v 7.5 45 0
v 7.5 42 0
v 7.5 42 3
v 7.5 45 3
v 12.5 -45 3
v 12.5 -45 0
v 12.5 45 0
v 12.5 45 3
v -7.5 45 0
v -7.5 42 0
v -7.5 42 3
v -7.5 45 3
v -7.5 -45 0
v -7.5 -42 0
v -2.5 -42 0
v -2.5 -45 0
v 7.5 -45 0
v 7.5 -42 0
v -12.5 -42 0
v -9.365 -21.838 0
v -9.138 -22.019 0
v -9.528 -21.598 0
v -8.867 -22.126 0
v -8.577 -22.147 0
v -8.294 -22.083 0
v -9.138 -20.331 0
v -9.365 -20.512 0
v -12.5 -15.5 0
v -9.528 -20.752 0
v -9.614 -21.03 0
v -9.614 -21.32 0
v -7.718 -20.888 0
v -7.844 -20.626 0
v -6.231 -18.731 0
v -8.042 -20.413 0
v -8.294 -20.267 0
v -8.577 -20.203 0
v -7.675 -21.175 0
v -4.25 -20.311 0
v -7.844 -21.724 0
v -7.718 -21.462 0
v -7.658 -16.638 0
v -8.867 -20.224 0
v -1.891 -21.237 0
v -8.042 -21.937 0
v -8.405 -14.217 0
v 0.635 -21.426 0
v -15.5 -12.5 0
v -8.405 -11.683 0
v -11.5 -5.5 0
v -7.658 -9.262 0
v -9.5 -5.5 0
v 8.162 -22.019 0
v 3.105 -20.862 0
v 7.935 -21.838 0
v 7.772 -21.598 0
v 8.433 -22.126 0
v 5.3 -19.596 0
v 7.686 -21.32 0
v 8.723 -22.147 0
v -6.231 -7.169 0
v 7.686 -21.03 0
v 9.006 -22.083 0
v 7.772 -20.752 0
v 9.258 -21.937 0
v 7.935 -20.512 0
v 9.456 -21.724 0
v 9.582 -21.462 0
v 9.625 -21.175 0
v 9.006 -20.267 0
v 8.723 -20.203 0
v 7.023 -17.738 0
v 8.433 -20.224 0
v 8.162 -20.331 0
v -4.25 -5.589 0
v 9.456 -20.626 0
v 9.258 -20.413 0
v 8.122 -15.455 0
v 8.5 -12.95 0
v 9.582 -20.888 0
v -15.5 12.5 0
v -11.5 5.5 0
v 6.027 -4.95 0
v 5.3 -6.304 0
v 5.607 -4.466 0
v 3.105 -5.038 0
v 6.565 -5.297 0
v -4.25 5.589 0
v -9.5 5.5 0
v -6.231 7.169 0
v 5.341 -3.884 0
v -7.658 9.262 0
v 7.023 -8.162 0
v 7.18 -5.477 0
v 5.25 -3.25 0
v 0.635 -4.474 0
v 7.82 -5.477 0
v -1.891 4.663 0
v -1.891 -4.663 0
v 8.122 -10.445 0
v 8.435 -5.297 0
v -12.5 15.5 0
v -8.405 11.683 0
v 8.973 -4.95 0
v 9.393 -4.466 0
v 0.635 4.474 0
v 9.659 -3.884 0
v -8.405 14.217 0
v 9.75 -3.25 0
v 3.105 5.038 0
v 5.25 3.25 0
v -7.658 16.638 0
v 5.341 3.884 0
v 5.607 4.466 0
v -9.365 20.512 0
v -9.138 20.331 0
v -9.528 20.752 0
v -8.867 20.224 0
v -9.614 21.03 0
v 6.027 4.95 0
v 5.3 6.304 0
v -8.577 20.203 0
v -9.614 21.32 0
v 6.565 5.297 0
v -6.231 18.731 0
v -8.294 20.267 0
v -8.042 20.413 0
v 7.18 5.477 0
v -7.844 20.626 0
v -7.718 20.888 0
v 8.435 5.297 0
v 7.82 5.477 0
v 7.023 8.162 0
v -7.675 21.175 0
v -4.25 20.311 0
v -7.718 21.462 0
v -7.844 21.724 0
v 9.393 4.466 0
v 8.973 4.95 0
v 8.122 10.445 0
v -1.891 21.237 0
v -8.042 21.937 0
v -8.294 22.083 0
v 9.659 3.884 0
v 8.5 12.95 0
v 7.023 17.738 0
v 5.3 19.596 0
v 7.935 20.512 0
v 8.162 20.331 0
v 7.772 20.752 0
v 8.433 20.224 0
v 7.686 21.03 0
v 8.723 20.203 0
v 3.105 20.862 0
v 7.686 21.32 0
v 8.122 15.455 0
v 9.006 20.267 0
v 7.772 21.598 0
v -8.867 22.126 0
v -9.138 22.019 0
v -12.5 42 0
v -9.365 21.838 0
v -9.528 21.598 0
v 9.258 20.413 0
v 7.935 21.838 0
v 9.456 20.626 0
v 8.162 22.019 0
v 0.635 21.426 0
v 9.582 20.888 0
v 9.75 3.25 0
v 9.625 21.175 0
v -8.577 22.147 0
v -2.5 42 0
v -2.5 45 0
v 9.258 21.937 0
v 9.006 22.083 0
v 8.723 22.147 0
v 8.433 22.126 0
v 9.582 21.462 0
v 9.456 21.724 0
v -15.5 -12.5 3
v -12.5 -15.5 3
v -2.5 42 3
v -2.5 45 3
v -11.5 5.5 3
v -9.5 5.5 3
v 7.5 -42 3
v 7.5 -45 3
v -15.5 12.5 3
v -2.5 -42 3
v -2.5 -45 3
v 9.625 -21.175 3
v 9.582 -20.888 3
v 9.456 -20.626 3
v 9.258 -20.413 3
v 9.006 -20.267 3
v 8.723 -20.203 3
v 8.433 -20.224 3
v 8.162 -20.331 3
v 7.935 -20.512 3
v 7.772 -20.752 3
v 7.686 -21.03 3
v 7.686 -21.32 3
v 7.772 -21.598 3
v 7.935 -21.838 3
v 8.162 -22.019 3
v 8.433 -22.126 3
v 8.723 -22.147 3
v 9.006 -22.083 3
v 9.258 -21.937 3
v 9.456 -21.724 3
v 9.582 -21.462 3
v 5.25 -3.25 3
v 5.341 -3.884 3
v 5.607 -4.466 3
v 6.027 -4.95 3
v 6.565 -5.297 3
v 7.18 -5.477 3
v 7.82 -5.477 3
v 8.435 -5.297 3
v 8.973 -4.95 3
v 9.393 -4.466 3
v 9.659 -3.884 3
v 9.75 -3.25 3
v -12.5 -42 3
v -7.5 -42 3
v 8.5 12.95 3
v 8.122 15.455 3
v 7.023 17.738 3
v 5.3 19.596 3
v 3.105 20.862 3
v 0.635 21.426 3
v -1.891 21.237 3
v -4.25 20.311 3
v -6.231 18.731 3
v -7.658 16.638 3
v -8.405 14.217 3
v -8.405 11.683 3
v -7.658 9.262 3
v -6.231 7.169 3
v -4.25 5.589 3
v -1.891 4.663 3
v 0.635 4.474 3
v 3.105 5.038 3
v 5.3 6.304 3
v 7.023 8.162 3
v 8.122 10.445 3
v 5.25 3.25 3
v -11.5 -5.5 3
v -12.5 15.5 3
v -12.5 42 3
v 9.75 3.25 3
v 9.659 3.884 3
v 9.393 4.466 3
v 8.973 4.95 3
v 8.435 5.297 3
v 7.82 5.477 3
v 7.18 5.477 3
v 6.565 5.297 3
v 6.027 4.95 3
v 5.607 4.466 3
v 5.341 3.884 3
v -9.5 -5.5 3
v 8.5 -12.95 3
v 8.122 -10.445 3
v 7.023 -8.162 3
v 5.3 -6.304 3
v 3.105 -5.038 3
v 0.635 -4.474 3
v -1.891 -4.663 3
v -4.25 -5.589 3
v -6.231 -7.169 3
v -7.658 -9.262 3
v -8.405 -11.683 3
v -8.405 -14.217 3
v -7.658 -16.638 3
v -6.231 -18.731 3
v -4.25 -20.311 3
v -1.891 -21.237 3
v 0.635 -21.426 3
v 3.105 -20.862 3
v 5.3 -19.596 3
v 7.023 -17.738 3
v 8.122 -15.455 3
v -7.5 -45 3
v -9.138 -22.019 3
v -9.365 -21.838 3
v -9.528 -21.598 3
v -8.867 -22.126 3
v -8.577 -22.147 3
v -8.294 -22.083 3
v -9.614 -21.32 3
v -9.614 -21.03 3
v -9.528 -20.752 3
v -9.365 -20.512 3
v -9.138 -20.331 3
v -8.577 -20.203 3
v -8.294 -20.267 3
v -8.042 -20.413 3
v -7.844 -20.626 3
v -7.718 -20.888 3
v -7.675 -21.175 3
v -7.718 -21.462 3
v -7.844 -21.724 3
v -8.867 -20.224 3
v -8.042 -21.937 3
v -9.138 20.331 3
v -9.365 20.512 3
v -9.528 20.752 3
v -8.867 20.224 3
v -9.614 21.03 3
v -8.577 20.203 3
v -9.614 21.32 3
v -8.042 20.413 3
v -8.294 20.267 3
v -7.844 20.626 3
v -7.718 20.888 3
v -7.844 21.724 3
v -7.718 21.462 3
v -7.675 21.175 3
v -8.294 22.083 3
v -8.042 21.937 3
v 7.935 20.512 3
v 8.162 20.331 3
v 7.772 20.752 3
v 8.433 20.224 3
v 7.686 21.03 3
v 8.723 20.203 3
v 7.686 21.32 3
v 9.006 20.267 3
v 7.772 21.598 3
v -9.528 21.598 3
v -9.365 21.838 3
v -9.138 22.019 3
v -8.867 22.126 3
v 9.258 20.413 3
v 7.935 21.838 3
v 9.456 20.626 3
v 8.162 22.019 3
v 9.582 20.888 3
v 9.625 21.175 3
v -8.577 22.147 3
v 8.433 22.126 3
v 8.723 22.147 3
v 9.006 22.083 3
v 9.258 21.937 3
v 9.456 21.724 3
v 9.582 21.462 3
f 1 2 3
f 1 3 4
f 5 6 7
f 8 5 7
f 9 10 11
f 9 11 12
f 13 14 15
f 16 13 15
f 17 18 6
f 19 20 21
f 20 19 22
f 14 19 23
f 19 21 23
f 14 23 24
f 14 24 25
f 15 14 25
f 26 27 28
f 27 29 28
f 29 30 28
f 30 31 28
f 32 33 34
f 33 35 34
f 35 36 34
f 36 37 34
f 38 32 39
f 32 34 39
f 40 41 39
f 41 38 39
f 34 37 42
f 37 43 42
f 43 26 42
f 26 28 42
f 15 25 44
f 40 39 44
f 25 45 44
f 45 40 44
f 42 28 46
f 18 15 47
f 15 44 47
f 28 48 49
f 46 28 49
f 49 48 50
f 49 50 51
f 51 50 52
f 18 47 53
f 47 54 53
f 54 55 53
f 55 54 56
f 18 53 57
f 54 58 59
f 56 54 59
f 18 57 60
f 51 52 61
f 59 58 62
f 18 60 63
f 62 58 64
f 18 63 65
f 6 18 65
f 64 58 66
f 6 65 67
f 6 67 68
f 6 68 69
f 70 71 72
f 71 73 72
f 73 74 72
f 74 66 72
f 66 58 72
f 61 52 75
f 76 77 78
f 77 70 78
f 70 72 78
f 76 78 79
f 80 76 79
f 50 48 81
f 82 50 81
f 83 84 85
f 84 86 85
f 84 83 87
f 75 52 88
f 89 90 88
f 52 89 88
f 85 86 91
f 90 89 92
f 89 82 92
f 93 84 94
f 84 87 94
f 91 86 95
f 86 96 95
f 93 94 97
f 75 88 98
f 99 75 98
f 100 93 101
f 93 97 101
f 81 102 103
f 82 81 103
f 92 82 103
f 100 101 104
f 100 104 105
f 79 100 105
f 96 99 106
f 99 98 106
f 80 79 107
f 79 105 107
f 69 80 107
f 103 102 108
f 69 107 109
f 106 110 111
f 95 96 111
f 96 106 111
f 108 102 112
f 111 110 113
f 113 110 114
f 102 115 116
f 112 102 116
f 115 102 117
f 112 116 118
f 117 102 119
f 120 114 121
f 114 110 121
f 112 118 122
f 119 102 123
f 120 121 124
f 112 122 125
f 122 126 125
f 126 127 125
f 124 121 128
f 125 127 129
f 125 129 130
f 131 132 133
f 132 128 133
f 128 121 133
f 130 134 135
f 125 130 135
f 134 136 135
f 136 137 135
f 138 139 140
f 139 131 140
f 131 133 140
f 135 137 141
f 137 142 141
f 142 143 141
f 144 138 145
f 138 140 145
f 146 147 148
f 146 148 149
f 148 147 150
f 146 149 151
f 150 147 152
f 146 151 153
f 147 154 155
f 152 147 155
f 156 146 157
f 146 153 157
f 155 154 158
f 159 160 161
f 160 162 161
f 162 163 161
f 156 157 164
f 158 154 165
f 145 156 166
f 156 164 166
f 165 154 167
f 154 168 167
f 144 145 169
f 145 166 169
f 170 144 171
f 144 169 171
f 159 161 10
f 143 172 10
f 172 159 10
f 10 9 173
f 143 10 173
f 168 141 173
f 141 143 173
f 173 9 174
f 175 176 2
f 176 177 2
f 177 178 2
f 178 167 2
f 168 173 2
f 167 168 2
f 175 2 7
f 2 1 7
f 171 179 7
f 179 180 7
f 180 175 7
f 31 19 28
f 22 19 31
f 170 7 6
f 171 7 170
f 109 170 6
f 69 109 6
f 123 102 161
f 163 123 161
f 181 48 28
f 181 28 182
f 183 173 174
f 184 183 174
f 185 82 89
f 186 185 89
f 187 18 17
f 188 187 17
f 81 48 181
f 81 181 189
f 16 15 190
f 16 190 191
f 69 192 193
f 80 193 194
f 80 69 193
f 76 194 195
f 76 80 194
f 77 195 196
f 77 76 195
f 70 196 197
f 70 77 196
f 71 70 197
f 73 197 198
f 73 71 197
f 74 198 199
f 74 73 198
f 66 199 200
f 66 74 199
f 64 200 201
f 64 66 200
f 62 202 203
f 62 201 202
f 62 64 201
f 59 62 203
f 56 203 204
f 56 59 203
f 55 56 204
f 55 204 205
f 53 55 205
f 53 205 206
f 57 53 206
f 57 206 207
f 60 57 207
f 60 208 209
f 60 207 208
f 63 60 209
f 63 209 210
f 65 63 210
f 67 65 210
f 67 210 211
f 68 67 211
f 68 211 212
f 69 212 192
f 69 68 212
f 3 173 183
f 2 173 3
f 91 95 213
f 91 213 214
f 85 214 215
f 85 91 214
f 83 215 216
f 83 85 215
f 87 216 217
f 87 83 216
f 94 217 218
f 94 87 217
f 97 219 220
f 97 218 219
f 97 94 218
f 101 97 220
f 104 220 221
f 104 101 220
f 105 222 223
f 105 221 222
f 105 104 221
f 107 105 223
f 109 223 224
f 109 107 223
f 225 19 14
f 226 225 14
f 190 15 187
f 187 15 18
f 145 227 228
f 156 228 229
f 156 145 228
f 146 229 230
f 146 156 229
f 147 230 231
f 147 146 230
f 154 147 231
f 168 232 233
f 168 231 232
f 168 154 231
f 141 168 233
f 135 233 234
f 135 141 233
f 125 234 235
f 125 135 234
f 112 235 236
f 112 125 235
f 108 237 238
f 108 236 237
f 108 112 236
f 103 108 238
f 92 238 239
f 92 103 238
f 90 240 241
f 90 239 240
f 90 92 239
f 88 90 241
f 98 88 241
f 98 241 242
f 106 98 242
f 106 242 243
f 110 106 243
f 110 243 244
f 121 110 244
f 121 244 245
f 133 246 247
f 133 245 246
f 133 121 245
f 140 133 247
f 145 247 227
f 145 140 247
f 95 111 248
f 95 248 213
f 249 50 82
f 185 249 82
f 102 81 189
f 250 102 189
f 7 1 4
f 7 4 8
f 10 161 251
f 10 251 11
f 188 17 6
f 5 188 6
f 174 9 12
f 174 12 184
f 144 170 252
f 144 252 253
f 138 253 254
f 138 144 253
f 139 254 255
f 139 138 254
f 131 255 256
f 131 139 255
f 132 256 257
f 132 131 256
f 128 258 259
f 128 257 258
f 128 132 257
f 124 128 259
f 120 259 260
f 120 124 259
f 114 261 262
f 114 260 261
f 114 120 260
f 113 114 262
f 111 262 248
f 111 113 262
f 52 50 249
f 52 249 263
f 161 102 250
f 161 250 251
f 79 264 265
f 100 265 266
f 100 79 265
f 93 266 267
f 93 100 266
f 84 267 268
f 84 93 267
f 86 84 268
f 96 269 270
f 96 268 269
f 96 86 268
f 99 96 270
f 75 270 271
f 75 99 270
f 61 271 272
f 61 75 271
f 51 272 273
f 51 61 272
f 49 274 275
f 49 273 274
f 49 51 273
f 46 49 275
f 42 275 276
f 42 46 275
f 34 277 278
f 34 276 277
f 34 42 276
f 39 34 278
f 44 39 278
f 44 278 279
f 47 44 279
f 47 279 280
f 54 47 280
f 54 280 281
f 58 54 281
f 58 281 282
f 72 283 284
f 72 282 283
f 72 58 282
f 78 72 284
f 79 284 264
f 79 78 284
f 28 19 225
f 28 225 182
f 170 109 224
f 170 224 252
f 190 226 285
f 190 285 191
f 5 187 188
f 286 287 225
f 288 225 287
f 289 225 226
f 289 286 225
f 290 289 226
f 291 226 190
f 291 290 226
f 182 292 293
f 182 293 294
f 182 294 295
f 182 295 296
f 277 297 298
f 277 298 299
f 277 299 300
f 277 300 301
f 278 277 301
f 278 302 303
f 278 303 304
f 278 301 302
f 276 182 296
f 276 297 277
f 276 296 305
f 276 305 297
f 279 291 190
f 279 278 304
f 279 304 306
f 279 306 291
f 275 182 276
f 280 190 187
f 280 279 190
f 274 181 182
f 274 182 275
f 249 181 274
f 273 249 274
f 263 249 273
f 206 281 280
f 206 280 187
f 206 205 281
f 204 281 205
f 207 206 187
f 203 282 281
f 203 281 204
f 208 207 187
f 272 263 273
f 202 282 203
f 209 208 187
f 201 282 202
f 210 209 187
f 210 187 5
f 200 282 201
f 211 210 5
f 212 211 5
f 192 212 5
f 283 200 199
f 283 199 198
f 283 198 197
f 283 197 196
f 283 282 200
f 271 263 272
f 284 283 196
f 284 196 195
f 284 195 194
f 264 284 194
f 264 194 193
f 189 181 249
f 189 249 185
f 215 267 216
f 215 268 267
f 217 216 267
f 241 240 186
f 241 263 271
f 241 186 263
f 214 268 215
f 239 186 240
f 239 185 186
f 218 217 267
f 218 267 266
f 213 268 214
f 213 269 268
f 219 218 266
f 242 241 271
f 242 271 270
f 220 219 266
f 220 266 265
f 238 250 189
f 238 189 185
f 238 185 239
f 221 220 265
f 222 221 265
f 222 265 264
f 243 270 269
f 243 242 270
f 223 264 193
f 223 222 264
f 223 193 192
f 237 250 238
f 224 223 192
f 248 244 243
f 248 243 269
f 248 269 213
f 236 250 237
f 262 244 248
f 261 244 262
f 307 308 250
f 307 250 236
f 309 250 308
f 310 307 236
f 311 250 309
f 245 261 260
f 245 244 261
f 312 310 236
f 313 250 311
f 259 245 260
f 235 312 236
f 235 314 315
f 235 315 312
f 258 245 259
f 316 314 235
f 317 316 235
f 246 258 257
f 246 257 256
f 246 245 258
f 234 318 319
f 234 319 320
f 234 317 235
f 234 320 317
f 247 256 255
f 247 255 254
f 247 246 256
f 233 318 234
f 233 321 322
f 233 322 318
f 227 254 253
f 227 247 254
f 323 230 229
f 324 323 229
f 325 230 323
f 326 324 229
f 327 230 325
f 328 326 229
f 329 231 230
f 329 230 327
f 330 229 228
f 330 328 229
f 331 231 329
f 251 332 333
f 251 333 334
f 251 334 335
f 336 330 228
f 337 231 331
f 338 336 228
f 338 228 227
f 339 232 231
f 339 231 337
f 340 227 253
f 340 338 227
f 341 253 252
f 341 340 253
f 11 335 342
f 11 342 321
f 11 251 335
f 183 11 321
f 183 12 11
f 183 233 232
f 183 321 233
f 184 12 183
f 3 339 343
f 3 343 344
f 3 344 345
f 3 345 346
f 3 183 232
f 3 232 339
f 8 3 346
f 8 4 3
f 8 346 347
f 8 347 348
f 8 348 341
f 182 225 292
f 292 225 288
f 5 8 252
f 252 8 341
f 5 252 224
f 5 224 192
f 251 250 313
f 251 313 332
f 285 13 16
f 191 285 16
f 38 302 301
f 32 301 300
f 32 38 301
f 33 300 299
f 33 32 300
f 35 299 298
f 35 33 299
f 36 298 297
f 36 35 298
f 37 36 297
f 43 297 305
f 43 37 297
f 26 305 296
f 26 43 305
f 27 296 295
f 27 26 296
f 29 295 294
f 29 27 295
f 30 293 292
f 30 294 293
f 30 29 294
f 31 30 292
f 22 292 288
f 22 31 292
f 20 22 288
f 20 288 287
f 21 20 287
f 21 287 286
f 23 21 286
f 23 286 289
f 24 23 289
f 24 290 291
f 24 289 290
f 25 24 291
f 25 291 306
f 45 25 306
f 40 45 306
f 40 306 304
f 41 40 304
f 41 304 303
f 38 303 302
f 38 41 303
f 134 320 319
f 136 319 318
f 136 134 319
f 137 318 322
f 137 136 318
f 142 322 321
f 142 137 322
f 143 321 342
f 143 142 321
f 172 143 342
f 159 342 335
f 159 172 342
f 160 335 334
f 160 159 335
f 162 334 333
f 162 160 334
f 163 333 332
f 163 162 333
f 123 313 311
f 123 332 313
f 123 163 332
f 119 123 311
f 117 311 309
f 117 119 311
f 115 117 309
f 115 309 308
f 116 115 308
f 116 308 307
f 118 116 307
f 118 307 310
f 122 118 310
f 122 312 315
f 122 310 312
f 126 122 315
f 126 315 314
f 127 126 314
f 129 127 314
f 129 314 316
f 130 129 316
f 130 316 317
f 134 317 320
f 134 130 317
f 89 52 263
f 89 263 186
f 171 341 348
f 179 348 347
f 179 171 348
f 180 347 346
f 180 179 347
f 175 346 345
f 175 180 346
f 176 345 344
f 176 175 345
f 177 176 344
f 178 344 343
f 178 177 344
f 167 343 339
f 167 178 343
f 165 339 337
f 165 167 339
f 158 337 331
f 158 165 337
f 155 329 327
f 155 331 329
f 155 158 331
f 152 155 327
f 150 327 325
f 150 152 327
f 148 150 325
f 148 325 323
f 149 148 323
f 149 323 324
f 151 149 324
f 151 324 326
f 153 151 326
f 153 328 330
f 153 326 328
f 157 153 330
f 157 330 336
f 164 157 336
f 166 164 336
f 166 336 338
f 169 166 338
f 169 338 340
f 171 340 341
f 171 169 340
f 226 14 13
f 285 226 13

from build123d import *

# Parameters (mm, degrees)
CROQUIS2_W              = 25
CROQUIS2_H              = 90
SALIENTE_EXTRUIR1_DEPTH = 3
CROQUIS3_W              = 10
CROQUIS3_H              = 3
CROQUIS3_W_2            = 5
CORTAR_EXTRUIR1_DEPTH   = 47.800106837
CROQUIS5_R              = 8.5
CROQUIS5_R_2            = 0.975
CORTAR_EXTRUIR2_DEPTH   = 47.800106837
CROQUIS6_W              = 2
CROQUIS6_H              = 11
CORTAR_EXTRUIR3_DEPTH   = 10
CROQUIS7_W              = 3
CROQUIS7_H              = 25
SALIENTE_EXTRUIR2_DEPTH = 3
CHAFL_N1_SIZE           = 3


with BuildPart() as part:
    # Croquis2 → Saliente-Extruir1 (new body)
    with BuildSketch(Plane.XY):
        Rectangle(CROQUIS2_W, CROQUIS2_H)
    extrude(amount=SALIENTE_EXTRUIR1_DEPTH)

    # Croquis3 → Cortar-Extruir1 (cut, through all)
    with BuildSketch(Plane.XY):
        with Locations((2.5, 43.5)):
            Rectangle(CROQUIS3_W, CROQUIS3_H)
        with Locations((-10, 43.5)):
            Rectangle(CROQUIS3_W_2, CROQUIS3_H)
    cortar_extruir1 = extrude(amount=CORTAR_EXTRUIR1_DEPTH, mode=Mode.SUBTRACT)

    # Simetría2: Cortar-Extruir1 across plane
    add(cortar_extruir1.mirror(Plane.ZX), mode=Mode.SUBTRACT)

    # Croquis5 → Cortar-Extruir2 (cut, through all)
    with BuildSketch(Plane.XY):
        with Locations((0, 12.95)):
            Circle(CROQUIS5_R)
        with Locations((0, -12.95)):
            Circle(CROQUIS5_R)
        with Locations((-8.65, 21.175)):
            Circle(CROQUIS5_R_2)
        with Locations((8.65, 21.175)):
            Circle(CROQUIS5_R_2)
        with Locations((8.65, -21.175)):
            Circle(CROQUIS5_R_2)
        with Locations((-8.65, -21.175)):
            Circle(CROQUIS5_R_2)
        with BuildLine():
            Line((9.75, -3.25), (9.75, 3.25))
            ThreePointArc((9.75, 3.25), (7.5, 5.5), (5.25, 3.25))
            Line((5.25, 3.25), (5.25, -3.25))
            ThreePointArc((5.25, -3.25), (7.5, -5.5), (9.75, -3.25))
        make_face()
    extrude(amount=CORTAR_EXTRUIR2_DEPTH, mode=Mode.SUBTRACT)

    # Croquis6 → Cortar-Extruir3 (cut)
    with BuildSketch(Plane.XY):
        with Locations((-10.5, 0)):
            Rectangle(CROQUIS6_W, CROQUIS6_H)
    extrude(amount=CORTAR_EXTRUIR3_DEPTH, mode=Mode.SUBTRACT)

    # Croquis7 → Saliente-Extruir2 (add)
    with BuildSketch(Plane.XY):
        with Locations((-14, 0)):
            Rectangle(CROQUIS7_W, CROQUIS7_H)
    extrude(amount=SALIENTE_EXTRUIR2_DEPTH)

    # Chaflán1
    chafl_n1_edges = [part.edges().sort_by_distance(p)[0] for p in [
        (-12.5, -12.5, 1.5),
        (-12.5, 12.5, 1.5),
    ]]
    chamfer(chafl_n1_edges, length=CHAFL_N1_SIZE - 0.0001)  # a hair under: the kernel refuses the full size


solid = part.part
